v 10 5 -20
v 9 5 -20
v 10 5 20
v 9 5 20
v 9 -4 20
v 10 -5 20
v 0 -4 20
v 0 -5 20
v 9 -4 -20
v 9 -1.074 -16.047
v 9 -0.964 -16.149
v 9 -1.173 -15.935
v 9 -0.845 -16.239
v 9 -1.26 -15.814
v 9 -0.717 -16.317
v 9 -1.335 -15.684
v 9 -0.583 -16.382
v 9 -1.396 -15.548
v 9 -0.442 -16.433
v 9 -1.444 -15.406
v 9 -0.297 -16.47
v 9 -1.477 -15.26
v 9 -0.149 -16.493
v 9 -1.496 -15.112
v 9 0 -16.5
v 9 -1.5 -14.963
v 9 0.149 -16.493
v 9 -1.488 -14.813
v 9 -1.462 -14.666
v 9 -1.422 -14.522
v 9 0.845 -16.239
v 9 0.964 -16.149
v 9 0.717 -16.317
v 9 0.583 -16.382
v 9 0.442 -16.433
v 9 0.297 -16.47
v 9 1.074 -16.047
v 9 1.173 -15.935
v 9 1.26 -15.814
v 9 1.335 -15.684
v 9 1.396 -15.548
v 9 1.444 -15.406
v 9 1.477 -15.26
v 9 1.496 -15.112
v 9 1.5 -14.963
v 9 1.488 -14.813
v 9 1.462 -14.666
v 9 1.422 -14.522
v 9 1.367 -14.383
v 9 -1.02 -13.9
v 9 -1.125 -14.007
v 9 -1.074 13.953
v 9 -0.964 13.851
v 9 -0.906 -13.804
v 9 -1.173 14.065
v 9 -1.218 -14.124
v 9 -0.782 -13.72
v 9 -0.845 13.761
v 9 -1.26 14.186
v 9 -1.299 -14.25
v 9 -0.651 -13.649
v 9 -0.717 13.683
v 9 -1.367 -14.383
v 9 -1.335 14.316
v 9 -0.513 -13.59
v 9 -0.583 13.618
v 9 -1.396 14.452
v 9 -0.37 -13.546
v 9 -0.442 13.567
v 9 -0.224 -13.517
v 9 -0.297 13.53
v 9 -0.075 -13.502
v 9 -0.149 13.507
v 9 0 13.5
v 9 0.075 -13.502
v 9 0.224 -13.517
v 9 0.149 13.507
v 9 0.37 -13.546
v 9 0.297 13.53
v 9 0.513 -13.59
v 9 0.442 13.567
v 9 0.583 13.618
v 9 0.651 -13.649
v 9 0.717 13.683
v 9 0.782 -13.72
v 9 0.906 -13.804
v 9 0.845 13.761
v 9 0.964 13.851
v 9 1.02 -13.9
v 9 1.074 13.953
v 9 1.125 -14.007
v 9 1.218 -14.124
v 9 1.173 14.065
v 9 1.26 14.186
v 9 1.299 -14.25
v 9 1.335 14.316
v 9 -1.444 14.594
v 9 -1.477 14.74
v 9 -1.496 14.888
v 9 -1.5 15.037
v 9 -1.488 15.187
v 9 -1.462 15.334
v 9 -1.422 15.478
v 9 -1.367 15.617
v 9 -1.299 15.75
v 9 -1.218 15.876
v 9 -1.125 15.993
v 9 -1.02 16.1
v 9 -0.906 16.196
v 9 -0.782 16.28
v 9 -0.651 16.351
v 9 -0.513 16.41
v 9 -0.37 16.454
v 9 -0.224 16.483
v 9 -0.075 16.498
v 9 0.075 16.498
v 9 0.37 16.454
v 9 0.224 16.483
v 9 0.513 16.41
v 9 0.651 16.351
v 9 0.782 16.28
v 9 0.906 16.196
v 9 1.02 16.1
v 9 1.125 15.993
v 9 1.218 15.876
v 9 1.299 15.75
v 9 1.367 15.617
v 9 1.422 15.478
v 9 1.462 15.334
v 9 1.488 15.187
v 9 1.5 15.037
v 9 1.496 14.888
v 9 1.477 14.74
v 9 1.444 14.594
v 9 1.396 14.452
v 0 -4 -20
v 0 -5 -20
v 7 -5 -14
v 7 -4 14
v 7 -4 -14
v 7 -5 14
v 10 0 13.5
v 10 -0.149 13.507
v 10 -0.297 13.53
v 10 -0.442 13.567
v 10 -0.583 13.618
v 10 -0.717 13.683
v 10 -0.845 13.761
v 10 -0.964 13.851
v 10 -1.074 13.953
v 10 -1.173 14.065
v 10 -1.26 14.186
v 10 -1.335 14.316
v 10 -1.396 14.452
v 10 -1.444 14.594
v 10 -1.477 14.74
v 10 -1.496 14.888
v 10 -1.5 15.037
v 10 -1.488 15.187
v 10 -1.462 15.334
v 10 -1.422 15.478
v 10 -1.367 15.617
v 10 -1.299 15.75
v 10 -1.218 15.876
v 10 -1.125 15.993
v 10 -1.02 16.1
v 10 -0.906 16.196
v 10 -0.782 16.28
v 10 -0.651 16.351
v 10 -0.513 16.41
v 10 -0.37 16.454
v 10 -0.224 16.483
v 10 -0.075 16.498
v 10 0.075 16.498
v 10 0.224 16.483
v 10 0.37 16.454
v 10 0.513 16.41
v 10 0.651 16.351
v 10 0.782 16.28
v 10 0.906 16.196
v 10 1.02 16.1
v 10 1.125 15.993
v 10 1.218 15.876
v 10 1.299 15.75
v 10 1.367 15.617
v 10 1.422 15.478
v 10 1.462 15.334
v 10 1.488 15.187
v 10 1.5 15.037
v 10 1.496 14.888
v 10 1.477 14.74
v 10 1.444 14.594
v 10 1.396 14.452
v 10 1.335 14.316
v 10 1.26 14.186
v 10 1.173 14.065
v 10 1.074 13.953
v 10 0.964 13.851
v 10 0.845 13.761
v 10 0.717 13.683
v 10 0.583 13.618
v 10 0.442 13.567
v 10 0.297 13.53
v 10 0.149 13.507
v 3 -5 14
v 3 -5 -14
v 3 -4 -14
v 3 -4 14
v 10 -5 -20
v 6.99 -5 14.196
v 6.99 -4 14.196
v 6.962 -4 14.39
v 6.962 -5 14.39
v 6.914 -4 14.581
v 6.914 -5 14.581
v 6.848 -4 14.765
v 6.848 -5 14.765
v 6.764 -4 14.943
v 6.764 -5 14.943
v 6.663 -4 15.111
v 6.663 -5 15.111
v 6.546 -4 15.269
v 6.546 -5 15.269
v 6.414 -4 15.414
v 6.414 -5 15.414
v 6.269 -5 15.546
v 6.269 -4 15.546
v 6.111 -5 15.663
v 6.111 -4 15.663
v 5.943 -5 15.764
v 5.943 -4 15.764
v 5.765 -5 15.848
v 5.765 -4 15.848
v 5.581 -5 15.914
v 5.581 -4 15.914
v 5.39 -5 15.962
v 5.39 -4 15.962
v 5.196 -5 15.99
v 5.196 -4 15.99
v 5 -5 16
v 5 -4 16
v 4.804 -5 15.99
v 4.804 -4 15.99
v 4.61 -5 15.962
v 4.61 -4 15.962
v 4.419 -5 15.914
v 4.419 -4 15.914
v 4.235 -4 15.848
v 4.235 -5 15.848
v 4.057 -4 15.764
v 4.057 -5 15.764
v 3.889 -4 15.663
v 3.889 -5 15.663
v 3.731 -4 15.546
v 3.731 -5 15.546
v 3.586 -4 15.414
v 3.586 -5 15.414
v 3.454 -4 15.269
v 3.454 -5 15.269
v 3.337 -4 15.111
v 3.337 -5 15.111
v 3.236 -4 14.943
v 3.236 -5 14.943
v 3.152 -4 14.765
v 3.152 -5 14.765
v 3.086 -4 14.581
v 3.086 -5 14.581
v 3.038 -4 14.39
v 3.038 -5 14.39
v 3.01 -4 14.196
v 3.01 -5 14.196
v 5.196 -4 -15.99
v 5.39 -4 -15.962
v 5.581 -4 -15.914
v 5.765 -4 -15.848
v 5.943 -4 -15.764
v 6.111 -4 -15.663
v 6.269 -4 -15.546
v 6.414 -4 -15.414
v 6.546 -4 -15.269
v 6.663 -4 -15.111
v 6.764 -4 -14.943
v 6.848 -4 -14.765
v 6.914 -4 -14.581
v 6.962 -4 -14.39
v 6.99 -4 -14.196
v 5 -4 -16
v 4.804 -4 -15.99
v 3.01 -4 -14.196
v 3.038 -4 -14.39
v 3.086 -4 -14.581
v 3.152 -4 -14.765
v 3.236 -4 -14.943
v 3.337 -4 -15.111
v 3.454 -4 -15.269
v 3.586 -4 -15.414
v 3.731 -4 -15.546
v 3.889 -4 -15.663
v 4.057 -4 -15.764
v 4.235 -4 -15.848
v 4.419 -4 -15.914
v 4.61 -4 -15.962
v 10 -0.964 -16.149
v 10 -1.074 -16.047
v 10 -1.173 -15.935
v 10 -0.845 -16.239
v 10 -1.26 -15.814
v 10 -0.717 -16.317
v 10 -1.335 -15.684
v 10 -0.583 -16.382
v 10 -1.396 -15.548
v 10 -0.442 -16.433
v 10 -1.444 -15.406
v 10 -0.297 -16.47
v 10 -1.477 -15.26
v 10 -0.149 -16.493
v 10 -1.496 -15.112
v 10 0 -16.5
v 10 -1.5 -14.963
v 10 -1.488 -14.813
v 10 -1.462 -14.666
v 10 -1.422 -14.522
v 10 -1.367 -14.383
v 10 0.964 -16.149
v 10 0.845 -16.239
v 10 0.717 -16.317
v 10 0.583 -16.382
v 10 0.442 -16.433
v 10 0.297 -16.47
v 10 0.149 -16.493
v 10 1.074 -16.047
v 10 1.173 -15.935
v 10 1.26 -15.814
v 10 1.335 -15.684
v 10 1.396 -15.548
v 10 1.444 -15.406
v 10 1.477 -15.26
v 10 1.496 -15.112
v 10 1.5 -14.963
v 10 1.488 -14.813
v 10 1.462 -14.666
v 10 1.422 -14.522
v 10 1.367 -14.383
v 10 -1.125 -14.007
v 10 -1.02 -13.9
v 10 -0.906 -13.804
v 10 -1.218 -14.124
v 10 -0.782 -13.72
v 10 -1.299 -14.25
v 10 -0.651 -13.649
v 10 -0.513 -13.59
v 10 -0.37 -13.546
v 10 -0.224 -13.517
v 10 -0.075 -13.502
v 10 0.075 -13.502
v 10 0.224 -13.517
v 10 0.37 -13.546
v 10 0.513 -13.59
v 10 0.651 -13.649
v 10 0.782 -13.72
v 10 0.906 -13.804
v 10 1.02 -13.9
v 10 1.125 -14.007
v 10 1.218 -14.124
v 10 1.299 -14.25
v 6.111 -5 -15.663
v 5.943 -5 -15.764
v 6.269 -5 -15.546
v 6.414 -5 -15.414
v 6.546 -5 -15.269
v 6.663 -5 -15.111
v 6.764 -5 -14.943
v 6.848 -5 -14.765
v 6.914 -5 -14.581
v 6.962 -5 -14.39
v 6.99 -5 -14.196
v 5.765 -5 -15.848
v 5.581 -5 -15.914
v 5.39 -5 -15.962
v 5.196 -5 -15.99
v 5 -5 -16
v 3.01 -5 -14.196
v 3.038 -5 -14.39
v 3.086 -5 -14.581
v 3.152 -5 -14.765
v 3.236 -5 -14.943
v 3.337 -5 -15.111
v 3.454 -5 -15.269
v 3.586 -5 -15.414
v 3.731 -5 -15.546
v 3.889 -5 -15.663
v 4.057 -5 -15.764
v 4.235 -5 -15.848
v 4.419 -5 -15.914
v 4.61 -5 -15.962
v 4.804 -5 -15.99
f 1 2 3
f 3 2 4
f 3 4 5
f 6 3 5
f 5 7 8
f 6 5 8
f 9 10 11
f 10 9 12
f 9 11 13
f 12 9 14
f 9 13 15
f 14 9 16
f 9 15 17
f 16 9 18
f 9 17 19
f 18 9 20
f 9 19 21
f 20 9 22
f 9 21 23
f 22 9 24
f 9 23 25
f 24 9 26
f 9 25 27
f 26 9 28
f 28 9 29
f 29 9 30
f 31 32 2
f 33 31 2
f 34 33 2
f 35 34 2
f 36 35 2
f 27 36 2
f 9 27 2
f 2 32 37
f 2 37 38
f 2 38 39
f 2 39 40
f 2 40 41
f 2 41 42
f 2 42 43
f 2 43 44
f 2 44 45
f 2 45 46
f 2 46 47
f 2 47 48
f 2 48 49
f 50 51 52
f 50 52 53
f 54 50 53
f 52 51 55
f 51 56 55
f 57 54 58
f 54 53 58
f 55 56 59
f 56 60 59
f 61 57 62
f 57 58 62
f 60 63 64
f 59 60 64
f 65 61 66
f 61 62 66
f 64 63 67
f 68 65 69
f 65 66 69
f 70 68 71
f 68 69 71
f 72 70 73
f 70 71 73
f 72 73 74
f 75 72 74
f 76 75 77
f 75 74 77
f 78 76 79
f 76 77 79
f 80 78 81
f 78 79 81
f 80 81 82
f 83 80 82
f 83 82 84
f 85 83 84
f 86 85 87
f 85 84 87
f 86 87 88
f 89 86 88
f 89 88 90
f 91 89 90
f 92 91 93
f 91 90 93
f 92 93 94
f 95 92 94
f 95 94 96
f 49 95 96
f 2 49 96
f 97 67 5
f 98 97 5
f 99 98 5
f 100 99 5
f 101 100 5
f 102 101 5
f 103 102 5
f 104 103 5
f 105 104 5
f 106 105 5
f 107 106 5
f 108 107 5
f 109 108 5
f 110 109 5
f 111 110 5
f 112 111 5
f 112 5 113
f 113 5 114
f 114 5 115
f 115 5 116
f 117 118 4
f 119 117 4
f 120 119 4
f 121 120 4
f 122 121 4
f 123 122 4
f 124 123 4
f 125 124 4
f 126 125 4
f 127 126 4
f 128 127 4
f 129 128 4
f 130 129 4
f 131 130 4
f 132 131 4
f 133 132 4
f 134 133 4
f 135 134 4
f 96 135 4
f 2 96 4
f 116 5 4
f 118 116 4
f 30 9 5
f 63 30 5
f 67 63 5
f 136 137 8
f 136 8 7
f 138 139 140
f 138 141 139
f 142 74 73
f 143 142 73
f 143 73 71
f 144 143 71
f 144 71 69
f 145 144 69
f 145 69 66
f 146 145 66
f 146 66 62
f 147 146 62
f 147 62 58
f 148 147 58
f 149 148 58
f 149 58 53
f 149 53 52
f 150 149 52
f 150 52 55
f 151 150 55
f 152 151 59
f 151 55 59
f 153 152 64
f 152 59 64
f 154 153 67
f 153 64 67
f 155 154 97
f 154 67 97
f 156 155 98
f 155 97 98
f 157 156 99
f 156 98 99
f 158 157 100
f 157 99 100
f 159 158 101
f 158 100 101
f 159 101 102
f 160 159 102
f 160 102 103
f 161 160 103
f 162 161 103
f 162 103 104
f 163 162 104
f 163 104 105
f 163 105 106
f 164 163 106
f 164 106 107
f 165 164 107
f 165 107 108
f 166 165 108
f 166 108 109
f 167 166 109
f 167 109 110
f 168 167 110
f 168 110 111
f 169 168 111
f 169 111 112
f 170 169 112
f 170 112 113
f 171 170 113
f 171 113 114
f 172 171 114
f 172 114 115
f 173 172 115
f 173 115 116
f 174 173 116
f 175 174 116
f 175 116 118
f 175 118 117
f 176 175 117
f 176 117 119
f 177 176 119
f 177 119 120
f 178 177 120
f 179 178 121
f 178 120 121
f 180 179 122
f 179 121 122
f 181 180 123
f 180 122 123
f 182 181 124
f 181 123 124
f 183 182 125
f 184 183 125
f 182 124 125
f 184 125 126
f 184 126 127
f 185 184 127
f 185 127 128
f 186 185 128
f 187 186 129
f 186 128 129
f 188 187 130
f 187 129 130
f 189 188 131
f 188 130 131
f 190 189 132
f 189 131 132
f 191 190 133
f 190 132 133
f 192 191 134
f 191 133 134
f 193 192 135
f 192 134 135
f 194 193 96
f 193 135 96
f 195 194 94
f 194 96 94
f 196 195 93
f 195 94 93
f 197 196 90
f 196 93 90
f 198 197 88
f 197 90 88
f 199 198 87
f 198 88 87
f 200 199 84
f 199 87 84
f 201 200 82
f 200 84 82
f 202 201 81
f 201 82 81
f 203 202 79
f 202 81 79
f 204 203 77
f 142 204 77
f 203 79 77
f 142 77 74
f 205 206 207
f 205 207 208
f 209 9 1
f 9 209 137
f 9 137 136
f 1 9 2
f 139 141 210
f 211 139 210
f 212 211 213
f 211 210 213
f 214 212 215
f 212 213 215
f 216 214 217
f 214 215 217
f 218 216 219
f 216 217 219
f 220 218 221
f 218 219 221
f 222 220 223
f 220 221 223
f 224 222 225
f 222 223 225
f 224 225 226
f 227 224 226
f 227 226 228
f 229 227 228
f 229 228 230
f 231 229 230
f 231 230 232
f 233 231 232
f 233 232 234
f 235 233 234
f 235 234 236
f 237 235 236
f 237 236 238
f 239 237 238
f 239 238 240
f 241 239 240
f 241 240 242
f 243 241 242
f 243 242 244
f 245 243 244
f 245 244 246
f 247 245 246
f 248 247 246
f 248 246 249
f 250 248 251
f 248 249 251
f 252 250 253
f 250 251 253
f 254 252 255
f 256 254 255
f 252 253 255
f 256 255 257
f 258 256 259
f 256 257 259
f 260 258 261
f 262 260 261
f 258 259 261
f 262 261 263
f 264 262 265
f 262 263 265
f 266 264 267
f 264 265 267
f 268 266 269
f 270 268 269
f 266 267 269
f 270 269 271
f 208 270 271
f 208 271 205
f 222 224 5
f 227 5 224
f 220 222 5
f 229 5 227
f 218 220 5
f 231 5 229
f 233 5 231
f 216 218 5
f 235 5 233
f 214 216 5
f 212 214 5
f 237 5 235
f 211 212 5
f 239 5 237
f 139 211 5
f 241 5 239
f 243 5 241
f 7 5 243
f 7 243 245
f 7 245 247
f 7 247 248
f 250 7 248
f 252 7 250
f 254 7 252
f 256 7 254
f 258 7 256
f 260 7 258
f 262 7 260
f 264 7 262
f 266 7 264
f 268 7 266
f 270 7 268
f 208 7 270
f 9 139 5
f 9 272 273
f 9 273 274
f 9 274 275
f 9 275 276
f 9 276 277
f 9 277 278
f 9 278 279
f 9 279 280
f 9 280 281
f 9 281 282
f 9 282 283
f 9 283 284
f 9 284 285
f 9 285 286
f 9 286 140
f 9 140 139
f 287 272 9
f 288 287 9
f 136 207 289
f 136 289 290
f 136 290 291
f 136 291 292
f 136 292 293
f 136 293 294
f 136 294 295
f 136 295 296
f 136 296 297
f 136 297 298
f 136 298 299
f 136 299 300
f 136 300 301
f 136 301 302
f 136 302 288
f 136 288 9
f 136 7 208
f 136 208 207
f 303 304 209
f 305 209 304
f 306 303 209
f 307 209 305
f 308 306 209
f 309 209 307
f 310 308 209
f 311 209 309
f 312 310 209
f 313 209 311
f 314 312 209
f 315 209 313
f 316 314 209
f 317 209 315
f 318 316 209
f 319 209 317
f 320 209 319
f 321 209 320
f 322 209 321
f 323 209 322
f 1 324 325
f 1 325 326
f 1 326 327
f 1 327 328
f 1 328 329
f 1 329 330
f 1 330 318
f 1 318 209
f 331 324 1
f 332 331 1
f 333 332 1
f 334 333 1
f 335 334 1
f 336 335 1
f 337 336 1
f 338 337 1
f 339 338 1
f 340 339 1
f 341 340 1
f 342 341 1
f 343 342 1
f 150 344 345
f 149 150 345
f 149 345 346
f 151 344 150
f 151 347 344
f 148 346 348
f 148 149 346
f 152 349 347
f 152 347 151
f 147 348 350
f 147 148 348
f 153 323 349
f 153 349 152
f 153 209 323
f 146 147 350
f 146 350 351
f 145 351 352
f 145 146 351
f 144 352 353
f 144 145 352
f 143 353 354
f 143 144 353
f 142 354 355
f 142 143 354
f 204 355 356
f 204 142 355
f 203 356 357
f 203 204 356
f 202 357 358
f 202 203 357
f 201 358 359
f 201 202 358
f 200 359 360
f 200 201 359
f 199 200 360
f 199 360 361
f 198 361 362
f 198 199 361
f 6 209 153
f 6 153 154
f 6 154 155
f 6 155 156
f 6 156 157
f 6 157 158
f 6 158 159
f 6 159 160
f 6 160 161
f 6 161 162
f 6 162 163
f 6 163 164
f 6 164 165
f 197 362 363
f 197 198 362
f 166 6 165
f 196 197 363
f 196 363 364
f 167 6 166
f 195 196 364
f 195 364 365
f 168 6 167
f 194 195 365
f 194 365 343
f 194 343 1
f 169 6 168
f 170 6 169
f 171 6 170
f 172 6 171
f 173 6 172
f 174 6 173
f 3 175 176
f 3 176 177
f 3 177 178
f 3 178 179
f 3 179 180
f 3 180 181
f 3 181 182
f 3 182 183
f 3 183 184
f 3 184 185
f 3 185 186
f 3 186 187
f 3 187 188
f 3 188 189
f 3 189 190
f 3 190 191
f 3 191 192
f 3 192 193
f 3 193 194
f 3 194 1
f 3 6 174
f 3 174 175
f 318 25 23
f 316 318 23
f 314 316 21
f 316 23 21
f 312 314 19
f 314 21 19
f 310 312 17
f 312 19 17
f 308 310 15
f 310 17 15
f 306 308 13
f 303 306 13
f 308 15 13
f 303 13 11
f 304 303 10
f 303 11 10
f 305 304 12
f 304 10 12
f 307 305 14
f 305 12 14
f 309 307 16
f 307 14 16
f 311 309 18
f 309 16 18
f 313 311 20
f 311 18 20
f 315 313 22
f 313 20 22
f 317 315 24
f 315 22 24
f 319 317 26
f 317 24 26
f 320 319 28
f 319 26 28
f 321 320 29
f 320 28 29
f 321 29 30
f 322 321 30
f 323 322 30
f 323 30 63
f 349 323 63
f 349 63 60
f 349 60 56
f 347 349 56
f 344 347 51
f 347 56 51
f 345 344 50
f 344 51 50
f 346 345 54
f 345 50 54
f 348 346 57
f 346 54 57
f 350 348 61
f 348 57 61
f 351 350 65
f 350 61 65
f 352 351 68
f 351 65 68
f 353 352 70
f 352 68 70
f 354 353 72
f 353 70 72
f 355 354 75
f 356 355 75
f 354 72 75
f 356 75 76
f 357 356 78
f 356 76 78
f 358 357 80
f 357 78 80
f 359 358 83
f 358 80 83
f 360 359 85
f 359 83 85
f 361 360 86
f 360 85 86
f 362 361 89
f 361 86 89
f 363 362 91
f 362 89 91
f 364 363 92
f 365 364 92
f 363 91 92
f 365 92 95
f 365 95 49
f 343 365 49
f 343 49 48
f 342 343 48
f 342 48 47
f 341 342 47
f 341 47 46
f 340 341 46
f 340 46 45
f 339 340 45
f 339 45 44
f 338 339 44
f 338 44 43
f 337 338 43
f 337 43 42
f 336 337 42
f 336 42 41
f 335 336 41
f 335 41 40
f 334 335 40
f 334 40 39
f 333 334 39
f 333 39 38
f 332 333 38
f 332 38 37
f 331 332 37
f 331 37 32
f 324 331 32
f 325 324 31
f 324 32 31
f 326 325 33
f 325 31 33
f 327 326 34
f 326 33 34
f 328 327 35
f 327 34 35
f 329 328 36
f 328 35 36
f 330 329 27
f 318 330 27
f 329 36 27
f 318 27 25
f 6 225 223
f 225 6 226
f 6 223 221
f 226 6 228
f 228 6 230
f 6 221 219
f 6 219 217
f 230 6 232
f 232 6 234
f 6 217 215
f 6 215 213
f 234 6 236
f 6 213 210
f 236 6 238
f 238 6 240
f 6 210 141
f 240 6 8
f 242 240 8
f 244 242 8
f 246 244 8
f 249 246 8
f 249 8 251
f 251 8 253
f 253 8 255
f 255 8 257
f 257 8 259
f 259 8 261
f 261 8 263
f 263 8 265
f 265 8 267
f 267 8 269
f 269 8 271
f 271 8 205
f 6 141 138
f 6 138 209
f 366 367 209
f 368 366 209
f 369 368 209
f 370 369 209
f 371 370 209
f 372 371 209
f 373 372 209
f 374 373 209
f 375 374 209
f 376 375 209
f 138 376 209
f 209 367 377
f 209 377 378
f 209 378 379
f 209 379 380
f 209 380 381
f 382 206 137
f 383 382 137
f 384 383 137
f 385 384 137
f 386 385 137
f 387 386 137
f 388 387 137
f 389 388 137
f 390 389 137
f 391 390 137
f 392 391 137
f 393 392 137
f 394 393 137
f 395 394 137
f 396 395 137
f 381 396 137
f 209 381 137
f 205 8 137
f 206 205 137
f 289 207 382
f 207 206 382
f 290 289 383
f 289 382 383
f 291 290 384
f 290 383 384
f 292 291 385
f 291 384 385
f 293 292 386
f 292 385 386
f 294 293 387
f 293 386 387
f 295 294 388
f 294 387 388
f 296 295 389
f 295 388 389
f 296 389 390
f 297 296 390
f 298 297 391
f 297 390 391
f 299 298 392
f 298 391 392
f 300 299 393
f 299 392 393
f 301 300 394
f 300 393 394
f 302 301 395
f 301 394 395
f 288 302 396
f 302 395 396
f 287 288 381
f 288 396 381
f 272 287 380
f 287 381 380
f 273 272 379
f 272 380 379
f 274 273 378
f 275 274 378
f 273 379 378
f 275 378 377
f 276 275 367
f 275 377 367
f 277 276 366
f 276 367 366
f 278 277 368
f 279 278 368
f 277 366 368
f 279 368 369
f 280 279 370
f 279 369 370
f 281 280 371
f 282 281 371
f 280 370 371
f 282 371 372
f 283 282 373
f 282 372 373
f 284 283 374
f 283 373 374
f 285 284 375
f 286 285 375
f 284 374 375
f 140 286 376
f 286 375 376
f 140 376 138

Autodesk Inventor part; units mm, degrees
ref_plane "YZ Plane" through (0, 0, 0) normal (1, 0, 0) x (0, 1, 0)
ref_plane "XZ Plane" through (0, 0, 0) normal (0, 1, 0) x (-1, 0, 0)
ref_plane "XY Plane" through (0, 0, 0) normal (0, 0, 1) x (1, 0, 0)
sketch "スケッチ1" plane through (0, 0, 0) normal (1, 0, 0) x (0, 1, 0)
  line L0 (-5, -20) -> (5, -20)
  line L1 (5, -20) -> (5, 20)
  line L2 (5, 20) -> (-5, 20)
  line L3 (-5, 20) -> (-5, -20)
  line L4 (-5, -20) -> (5, 20) construction
  line L5 (5, -20) -> (-5, 20) construction
  point P0 (0, 0)
  dimension "d0" = 10
  dimension "d1" = 40
extrude "押し出し1" add sketch "スケッチ1" along normal blind 10
shell "シェル1" thickness 1 removed faces 4 at (3.3333, 1.6667, 20) at (3.3333, 5, -6.6667) at (3.3333, -1.6667, -20) at (0, -1.6667, 6.6667)
sketch "スケッチ2" plane through (10, 0, 0) normal (1, 0, 0) x (0, 0, -1)
  line L0 (20, -5) -> (20, 5) projected
  line L1 (-20, 5) -> (-20, -5) projected
  line L2 (20, 5) -> (-20, 5) projected
  point P0 (0, 0)
  point P1 (-15, 0)
  point P2 (15, 0)
  dimension "d5" = 5
  dimension "d6" = 5
  dimension "d14" = 5
hole "穴1" at (10, 0, 15) at (10, 0, -15) direction (-1, 0, 0) diameter 3 end through all
sketch "スケッチ3" plane through (0, -5, -20) normal (0, -1, 0) x (1, 0, 0)
  line L0 (7, 34) -> (7, 6)
  arc A0 (3, 6) -> (7, 6) centre (5, 6) ccw
  line L1 (3, 6) -> (3, 34)
  arc A1 (7, 34) -> (3, 34) centre (5, 34) ccw
  line L2 (0, 40) -> (10, 40) projected
  line L3 (0, 40) -> (0, 0) projected
  line L4 (0, 0) -> (10, 0) projected
  point P0 (0, 20)
  point P1 (3, 20)
  point P2 (0, 20)
  dimension "d15" = 2
  dimension "d17" = 5
  dimension "d22" = 6
extrude "押し出し2" cut sketch "スケッチ3" against normal blind 1
properties part number "palmrest_L_large" material "アルミニウム 6061"
